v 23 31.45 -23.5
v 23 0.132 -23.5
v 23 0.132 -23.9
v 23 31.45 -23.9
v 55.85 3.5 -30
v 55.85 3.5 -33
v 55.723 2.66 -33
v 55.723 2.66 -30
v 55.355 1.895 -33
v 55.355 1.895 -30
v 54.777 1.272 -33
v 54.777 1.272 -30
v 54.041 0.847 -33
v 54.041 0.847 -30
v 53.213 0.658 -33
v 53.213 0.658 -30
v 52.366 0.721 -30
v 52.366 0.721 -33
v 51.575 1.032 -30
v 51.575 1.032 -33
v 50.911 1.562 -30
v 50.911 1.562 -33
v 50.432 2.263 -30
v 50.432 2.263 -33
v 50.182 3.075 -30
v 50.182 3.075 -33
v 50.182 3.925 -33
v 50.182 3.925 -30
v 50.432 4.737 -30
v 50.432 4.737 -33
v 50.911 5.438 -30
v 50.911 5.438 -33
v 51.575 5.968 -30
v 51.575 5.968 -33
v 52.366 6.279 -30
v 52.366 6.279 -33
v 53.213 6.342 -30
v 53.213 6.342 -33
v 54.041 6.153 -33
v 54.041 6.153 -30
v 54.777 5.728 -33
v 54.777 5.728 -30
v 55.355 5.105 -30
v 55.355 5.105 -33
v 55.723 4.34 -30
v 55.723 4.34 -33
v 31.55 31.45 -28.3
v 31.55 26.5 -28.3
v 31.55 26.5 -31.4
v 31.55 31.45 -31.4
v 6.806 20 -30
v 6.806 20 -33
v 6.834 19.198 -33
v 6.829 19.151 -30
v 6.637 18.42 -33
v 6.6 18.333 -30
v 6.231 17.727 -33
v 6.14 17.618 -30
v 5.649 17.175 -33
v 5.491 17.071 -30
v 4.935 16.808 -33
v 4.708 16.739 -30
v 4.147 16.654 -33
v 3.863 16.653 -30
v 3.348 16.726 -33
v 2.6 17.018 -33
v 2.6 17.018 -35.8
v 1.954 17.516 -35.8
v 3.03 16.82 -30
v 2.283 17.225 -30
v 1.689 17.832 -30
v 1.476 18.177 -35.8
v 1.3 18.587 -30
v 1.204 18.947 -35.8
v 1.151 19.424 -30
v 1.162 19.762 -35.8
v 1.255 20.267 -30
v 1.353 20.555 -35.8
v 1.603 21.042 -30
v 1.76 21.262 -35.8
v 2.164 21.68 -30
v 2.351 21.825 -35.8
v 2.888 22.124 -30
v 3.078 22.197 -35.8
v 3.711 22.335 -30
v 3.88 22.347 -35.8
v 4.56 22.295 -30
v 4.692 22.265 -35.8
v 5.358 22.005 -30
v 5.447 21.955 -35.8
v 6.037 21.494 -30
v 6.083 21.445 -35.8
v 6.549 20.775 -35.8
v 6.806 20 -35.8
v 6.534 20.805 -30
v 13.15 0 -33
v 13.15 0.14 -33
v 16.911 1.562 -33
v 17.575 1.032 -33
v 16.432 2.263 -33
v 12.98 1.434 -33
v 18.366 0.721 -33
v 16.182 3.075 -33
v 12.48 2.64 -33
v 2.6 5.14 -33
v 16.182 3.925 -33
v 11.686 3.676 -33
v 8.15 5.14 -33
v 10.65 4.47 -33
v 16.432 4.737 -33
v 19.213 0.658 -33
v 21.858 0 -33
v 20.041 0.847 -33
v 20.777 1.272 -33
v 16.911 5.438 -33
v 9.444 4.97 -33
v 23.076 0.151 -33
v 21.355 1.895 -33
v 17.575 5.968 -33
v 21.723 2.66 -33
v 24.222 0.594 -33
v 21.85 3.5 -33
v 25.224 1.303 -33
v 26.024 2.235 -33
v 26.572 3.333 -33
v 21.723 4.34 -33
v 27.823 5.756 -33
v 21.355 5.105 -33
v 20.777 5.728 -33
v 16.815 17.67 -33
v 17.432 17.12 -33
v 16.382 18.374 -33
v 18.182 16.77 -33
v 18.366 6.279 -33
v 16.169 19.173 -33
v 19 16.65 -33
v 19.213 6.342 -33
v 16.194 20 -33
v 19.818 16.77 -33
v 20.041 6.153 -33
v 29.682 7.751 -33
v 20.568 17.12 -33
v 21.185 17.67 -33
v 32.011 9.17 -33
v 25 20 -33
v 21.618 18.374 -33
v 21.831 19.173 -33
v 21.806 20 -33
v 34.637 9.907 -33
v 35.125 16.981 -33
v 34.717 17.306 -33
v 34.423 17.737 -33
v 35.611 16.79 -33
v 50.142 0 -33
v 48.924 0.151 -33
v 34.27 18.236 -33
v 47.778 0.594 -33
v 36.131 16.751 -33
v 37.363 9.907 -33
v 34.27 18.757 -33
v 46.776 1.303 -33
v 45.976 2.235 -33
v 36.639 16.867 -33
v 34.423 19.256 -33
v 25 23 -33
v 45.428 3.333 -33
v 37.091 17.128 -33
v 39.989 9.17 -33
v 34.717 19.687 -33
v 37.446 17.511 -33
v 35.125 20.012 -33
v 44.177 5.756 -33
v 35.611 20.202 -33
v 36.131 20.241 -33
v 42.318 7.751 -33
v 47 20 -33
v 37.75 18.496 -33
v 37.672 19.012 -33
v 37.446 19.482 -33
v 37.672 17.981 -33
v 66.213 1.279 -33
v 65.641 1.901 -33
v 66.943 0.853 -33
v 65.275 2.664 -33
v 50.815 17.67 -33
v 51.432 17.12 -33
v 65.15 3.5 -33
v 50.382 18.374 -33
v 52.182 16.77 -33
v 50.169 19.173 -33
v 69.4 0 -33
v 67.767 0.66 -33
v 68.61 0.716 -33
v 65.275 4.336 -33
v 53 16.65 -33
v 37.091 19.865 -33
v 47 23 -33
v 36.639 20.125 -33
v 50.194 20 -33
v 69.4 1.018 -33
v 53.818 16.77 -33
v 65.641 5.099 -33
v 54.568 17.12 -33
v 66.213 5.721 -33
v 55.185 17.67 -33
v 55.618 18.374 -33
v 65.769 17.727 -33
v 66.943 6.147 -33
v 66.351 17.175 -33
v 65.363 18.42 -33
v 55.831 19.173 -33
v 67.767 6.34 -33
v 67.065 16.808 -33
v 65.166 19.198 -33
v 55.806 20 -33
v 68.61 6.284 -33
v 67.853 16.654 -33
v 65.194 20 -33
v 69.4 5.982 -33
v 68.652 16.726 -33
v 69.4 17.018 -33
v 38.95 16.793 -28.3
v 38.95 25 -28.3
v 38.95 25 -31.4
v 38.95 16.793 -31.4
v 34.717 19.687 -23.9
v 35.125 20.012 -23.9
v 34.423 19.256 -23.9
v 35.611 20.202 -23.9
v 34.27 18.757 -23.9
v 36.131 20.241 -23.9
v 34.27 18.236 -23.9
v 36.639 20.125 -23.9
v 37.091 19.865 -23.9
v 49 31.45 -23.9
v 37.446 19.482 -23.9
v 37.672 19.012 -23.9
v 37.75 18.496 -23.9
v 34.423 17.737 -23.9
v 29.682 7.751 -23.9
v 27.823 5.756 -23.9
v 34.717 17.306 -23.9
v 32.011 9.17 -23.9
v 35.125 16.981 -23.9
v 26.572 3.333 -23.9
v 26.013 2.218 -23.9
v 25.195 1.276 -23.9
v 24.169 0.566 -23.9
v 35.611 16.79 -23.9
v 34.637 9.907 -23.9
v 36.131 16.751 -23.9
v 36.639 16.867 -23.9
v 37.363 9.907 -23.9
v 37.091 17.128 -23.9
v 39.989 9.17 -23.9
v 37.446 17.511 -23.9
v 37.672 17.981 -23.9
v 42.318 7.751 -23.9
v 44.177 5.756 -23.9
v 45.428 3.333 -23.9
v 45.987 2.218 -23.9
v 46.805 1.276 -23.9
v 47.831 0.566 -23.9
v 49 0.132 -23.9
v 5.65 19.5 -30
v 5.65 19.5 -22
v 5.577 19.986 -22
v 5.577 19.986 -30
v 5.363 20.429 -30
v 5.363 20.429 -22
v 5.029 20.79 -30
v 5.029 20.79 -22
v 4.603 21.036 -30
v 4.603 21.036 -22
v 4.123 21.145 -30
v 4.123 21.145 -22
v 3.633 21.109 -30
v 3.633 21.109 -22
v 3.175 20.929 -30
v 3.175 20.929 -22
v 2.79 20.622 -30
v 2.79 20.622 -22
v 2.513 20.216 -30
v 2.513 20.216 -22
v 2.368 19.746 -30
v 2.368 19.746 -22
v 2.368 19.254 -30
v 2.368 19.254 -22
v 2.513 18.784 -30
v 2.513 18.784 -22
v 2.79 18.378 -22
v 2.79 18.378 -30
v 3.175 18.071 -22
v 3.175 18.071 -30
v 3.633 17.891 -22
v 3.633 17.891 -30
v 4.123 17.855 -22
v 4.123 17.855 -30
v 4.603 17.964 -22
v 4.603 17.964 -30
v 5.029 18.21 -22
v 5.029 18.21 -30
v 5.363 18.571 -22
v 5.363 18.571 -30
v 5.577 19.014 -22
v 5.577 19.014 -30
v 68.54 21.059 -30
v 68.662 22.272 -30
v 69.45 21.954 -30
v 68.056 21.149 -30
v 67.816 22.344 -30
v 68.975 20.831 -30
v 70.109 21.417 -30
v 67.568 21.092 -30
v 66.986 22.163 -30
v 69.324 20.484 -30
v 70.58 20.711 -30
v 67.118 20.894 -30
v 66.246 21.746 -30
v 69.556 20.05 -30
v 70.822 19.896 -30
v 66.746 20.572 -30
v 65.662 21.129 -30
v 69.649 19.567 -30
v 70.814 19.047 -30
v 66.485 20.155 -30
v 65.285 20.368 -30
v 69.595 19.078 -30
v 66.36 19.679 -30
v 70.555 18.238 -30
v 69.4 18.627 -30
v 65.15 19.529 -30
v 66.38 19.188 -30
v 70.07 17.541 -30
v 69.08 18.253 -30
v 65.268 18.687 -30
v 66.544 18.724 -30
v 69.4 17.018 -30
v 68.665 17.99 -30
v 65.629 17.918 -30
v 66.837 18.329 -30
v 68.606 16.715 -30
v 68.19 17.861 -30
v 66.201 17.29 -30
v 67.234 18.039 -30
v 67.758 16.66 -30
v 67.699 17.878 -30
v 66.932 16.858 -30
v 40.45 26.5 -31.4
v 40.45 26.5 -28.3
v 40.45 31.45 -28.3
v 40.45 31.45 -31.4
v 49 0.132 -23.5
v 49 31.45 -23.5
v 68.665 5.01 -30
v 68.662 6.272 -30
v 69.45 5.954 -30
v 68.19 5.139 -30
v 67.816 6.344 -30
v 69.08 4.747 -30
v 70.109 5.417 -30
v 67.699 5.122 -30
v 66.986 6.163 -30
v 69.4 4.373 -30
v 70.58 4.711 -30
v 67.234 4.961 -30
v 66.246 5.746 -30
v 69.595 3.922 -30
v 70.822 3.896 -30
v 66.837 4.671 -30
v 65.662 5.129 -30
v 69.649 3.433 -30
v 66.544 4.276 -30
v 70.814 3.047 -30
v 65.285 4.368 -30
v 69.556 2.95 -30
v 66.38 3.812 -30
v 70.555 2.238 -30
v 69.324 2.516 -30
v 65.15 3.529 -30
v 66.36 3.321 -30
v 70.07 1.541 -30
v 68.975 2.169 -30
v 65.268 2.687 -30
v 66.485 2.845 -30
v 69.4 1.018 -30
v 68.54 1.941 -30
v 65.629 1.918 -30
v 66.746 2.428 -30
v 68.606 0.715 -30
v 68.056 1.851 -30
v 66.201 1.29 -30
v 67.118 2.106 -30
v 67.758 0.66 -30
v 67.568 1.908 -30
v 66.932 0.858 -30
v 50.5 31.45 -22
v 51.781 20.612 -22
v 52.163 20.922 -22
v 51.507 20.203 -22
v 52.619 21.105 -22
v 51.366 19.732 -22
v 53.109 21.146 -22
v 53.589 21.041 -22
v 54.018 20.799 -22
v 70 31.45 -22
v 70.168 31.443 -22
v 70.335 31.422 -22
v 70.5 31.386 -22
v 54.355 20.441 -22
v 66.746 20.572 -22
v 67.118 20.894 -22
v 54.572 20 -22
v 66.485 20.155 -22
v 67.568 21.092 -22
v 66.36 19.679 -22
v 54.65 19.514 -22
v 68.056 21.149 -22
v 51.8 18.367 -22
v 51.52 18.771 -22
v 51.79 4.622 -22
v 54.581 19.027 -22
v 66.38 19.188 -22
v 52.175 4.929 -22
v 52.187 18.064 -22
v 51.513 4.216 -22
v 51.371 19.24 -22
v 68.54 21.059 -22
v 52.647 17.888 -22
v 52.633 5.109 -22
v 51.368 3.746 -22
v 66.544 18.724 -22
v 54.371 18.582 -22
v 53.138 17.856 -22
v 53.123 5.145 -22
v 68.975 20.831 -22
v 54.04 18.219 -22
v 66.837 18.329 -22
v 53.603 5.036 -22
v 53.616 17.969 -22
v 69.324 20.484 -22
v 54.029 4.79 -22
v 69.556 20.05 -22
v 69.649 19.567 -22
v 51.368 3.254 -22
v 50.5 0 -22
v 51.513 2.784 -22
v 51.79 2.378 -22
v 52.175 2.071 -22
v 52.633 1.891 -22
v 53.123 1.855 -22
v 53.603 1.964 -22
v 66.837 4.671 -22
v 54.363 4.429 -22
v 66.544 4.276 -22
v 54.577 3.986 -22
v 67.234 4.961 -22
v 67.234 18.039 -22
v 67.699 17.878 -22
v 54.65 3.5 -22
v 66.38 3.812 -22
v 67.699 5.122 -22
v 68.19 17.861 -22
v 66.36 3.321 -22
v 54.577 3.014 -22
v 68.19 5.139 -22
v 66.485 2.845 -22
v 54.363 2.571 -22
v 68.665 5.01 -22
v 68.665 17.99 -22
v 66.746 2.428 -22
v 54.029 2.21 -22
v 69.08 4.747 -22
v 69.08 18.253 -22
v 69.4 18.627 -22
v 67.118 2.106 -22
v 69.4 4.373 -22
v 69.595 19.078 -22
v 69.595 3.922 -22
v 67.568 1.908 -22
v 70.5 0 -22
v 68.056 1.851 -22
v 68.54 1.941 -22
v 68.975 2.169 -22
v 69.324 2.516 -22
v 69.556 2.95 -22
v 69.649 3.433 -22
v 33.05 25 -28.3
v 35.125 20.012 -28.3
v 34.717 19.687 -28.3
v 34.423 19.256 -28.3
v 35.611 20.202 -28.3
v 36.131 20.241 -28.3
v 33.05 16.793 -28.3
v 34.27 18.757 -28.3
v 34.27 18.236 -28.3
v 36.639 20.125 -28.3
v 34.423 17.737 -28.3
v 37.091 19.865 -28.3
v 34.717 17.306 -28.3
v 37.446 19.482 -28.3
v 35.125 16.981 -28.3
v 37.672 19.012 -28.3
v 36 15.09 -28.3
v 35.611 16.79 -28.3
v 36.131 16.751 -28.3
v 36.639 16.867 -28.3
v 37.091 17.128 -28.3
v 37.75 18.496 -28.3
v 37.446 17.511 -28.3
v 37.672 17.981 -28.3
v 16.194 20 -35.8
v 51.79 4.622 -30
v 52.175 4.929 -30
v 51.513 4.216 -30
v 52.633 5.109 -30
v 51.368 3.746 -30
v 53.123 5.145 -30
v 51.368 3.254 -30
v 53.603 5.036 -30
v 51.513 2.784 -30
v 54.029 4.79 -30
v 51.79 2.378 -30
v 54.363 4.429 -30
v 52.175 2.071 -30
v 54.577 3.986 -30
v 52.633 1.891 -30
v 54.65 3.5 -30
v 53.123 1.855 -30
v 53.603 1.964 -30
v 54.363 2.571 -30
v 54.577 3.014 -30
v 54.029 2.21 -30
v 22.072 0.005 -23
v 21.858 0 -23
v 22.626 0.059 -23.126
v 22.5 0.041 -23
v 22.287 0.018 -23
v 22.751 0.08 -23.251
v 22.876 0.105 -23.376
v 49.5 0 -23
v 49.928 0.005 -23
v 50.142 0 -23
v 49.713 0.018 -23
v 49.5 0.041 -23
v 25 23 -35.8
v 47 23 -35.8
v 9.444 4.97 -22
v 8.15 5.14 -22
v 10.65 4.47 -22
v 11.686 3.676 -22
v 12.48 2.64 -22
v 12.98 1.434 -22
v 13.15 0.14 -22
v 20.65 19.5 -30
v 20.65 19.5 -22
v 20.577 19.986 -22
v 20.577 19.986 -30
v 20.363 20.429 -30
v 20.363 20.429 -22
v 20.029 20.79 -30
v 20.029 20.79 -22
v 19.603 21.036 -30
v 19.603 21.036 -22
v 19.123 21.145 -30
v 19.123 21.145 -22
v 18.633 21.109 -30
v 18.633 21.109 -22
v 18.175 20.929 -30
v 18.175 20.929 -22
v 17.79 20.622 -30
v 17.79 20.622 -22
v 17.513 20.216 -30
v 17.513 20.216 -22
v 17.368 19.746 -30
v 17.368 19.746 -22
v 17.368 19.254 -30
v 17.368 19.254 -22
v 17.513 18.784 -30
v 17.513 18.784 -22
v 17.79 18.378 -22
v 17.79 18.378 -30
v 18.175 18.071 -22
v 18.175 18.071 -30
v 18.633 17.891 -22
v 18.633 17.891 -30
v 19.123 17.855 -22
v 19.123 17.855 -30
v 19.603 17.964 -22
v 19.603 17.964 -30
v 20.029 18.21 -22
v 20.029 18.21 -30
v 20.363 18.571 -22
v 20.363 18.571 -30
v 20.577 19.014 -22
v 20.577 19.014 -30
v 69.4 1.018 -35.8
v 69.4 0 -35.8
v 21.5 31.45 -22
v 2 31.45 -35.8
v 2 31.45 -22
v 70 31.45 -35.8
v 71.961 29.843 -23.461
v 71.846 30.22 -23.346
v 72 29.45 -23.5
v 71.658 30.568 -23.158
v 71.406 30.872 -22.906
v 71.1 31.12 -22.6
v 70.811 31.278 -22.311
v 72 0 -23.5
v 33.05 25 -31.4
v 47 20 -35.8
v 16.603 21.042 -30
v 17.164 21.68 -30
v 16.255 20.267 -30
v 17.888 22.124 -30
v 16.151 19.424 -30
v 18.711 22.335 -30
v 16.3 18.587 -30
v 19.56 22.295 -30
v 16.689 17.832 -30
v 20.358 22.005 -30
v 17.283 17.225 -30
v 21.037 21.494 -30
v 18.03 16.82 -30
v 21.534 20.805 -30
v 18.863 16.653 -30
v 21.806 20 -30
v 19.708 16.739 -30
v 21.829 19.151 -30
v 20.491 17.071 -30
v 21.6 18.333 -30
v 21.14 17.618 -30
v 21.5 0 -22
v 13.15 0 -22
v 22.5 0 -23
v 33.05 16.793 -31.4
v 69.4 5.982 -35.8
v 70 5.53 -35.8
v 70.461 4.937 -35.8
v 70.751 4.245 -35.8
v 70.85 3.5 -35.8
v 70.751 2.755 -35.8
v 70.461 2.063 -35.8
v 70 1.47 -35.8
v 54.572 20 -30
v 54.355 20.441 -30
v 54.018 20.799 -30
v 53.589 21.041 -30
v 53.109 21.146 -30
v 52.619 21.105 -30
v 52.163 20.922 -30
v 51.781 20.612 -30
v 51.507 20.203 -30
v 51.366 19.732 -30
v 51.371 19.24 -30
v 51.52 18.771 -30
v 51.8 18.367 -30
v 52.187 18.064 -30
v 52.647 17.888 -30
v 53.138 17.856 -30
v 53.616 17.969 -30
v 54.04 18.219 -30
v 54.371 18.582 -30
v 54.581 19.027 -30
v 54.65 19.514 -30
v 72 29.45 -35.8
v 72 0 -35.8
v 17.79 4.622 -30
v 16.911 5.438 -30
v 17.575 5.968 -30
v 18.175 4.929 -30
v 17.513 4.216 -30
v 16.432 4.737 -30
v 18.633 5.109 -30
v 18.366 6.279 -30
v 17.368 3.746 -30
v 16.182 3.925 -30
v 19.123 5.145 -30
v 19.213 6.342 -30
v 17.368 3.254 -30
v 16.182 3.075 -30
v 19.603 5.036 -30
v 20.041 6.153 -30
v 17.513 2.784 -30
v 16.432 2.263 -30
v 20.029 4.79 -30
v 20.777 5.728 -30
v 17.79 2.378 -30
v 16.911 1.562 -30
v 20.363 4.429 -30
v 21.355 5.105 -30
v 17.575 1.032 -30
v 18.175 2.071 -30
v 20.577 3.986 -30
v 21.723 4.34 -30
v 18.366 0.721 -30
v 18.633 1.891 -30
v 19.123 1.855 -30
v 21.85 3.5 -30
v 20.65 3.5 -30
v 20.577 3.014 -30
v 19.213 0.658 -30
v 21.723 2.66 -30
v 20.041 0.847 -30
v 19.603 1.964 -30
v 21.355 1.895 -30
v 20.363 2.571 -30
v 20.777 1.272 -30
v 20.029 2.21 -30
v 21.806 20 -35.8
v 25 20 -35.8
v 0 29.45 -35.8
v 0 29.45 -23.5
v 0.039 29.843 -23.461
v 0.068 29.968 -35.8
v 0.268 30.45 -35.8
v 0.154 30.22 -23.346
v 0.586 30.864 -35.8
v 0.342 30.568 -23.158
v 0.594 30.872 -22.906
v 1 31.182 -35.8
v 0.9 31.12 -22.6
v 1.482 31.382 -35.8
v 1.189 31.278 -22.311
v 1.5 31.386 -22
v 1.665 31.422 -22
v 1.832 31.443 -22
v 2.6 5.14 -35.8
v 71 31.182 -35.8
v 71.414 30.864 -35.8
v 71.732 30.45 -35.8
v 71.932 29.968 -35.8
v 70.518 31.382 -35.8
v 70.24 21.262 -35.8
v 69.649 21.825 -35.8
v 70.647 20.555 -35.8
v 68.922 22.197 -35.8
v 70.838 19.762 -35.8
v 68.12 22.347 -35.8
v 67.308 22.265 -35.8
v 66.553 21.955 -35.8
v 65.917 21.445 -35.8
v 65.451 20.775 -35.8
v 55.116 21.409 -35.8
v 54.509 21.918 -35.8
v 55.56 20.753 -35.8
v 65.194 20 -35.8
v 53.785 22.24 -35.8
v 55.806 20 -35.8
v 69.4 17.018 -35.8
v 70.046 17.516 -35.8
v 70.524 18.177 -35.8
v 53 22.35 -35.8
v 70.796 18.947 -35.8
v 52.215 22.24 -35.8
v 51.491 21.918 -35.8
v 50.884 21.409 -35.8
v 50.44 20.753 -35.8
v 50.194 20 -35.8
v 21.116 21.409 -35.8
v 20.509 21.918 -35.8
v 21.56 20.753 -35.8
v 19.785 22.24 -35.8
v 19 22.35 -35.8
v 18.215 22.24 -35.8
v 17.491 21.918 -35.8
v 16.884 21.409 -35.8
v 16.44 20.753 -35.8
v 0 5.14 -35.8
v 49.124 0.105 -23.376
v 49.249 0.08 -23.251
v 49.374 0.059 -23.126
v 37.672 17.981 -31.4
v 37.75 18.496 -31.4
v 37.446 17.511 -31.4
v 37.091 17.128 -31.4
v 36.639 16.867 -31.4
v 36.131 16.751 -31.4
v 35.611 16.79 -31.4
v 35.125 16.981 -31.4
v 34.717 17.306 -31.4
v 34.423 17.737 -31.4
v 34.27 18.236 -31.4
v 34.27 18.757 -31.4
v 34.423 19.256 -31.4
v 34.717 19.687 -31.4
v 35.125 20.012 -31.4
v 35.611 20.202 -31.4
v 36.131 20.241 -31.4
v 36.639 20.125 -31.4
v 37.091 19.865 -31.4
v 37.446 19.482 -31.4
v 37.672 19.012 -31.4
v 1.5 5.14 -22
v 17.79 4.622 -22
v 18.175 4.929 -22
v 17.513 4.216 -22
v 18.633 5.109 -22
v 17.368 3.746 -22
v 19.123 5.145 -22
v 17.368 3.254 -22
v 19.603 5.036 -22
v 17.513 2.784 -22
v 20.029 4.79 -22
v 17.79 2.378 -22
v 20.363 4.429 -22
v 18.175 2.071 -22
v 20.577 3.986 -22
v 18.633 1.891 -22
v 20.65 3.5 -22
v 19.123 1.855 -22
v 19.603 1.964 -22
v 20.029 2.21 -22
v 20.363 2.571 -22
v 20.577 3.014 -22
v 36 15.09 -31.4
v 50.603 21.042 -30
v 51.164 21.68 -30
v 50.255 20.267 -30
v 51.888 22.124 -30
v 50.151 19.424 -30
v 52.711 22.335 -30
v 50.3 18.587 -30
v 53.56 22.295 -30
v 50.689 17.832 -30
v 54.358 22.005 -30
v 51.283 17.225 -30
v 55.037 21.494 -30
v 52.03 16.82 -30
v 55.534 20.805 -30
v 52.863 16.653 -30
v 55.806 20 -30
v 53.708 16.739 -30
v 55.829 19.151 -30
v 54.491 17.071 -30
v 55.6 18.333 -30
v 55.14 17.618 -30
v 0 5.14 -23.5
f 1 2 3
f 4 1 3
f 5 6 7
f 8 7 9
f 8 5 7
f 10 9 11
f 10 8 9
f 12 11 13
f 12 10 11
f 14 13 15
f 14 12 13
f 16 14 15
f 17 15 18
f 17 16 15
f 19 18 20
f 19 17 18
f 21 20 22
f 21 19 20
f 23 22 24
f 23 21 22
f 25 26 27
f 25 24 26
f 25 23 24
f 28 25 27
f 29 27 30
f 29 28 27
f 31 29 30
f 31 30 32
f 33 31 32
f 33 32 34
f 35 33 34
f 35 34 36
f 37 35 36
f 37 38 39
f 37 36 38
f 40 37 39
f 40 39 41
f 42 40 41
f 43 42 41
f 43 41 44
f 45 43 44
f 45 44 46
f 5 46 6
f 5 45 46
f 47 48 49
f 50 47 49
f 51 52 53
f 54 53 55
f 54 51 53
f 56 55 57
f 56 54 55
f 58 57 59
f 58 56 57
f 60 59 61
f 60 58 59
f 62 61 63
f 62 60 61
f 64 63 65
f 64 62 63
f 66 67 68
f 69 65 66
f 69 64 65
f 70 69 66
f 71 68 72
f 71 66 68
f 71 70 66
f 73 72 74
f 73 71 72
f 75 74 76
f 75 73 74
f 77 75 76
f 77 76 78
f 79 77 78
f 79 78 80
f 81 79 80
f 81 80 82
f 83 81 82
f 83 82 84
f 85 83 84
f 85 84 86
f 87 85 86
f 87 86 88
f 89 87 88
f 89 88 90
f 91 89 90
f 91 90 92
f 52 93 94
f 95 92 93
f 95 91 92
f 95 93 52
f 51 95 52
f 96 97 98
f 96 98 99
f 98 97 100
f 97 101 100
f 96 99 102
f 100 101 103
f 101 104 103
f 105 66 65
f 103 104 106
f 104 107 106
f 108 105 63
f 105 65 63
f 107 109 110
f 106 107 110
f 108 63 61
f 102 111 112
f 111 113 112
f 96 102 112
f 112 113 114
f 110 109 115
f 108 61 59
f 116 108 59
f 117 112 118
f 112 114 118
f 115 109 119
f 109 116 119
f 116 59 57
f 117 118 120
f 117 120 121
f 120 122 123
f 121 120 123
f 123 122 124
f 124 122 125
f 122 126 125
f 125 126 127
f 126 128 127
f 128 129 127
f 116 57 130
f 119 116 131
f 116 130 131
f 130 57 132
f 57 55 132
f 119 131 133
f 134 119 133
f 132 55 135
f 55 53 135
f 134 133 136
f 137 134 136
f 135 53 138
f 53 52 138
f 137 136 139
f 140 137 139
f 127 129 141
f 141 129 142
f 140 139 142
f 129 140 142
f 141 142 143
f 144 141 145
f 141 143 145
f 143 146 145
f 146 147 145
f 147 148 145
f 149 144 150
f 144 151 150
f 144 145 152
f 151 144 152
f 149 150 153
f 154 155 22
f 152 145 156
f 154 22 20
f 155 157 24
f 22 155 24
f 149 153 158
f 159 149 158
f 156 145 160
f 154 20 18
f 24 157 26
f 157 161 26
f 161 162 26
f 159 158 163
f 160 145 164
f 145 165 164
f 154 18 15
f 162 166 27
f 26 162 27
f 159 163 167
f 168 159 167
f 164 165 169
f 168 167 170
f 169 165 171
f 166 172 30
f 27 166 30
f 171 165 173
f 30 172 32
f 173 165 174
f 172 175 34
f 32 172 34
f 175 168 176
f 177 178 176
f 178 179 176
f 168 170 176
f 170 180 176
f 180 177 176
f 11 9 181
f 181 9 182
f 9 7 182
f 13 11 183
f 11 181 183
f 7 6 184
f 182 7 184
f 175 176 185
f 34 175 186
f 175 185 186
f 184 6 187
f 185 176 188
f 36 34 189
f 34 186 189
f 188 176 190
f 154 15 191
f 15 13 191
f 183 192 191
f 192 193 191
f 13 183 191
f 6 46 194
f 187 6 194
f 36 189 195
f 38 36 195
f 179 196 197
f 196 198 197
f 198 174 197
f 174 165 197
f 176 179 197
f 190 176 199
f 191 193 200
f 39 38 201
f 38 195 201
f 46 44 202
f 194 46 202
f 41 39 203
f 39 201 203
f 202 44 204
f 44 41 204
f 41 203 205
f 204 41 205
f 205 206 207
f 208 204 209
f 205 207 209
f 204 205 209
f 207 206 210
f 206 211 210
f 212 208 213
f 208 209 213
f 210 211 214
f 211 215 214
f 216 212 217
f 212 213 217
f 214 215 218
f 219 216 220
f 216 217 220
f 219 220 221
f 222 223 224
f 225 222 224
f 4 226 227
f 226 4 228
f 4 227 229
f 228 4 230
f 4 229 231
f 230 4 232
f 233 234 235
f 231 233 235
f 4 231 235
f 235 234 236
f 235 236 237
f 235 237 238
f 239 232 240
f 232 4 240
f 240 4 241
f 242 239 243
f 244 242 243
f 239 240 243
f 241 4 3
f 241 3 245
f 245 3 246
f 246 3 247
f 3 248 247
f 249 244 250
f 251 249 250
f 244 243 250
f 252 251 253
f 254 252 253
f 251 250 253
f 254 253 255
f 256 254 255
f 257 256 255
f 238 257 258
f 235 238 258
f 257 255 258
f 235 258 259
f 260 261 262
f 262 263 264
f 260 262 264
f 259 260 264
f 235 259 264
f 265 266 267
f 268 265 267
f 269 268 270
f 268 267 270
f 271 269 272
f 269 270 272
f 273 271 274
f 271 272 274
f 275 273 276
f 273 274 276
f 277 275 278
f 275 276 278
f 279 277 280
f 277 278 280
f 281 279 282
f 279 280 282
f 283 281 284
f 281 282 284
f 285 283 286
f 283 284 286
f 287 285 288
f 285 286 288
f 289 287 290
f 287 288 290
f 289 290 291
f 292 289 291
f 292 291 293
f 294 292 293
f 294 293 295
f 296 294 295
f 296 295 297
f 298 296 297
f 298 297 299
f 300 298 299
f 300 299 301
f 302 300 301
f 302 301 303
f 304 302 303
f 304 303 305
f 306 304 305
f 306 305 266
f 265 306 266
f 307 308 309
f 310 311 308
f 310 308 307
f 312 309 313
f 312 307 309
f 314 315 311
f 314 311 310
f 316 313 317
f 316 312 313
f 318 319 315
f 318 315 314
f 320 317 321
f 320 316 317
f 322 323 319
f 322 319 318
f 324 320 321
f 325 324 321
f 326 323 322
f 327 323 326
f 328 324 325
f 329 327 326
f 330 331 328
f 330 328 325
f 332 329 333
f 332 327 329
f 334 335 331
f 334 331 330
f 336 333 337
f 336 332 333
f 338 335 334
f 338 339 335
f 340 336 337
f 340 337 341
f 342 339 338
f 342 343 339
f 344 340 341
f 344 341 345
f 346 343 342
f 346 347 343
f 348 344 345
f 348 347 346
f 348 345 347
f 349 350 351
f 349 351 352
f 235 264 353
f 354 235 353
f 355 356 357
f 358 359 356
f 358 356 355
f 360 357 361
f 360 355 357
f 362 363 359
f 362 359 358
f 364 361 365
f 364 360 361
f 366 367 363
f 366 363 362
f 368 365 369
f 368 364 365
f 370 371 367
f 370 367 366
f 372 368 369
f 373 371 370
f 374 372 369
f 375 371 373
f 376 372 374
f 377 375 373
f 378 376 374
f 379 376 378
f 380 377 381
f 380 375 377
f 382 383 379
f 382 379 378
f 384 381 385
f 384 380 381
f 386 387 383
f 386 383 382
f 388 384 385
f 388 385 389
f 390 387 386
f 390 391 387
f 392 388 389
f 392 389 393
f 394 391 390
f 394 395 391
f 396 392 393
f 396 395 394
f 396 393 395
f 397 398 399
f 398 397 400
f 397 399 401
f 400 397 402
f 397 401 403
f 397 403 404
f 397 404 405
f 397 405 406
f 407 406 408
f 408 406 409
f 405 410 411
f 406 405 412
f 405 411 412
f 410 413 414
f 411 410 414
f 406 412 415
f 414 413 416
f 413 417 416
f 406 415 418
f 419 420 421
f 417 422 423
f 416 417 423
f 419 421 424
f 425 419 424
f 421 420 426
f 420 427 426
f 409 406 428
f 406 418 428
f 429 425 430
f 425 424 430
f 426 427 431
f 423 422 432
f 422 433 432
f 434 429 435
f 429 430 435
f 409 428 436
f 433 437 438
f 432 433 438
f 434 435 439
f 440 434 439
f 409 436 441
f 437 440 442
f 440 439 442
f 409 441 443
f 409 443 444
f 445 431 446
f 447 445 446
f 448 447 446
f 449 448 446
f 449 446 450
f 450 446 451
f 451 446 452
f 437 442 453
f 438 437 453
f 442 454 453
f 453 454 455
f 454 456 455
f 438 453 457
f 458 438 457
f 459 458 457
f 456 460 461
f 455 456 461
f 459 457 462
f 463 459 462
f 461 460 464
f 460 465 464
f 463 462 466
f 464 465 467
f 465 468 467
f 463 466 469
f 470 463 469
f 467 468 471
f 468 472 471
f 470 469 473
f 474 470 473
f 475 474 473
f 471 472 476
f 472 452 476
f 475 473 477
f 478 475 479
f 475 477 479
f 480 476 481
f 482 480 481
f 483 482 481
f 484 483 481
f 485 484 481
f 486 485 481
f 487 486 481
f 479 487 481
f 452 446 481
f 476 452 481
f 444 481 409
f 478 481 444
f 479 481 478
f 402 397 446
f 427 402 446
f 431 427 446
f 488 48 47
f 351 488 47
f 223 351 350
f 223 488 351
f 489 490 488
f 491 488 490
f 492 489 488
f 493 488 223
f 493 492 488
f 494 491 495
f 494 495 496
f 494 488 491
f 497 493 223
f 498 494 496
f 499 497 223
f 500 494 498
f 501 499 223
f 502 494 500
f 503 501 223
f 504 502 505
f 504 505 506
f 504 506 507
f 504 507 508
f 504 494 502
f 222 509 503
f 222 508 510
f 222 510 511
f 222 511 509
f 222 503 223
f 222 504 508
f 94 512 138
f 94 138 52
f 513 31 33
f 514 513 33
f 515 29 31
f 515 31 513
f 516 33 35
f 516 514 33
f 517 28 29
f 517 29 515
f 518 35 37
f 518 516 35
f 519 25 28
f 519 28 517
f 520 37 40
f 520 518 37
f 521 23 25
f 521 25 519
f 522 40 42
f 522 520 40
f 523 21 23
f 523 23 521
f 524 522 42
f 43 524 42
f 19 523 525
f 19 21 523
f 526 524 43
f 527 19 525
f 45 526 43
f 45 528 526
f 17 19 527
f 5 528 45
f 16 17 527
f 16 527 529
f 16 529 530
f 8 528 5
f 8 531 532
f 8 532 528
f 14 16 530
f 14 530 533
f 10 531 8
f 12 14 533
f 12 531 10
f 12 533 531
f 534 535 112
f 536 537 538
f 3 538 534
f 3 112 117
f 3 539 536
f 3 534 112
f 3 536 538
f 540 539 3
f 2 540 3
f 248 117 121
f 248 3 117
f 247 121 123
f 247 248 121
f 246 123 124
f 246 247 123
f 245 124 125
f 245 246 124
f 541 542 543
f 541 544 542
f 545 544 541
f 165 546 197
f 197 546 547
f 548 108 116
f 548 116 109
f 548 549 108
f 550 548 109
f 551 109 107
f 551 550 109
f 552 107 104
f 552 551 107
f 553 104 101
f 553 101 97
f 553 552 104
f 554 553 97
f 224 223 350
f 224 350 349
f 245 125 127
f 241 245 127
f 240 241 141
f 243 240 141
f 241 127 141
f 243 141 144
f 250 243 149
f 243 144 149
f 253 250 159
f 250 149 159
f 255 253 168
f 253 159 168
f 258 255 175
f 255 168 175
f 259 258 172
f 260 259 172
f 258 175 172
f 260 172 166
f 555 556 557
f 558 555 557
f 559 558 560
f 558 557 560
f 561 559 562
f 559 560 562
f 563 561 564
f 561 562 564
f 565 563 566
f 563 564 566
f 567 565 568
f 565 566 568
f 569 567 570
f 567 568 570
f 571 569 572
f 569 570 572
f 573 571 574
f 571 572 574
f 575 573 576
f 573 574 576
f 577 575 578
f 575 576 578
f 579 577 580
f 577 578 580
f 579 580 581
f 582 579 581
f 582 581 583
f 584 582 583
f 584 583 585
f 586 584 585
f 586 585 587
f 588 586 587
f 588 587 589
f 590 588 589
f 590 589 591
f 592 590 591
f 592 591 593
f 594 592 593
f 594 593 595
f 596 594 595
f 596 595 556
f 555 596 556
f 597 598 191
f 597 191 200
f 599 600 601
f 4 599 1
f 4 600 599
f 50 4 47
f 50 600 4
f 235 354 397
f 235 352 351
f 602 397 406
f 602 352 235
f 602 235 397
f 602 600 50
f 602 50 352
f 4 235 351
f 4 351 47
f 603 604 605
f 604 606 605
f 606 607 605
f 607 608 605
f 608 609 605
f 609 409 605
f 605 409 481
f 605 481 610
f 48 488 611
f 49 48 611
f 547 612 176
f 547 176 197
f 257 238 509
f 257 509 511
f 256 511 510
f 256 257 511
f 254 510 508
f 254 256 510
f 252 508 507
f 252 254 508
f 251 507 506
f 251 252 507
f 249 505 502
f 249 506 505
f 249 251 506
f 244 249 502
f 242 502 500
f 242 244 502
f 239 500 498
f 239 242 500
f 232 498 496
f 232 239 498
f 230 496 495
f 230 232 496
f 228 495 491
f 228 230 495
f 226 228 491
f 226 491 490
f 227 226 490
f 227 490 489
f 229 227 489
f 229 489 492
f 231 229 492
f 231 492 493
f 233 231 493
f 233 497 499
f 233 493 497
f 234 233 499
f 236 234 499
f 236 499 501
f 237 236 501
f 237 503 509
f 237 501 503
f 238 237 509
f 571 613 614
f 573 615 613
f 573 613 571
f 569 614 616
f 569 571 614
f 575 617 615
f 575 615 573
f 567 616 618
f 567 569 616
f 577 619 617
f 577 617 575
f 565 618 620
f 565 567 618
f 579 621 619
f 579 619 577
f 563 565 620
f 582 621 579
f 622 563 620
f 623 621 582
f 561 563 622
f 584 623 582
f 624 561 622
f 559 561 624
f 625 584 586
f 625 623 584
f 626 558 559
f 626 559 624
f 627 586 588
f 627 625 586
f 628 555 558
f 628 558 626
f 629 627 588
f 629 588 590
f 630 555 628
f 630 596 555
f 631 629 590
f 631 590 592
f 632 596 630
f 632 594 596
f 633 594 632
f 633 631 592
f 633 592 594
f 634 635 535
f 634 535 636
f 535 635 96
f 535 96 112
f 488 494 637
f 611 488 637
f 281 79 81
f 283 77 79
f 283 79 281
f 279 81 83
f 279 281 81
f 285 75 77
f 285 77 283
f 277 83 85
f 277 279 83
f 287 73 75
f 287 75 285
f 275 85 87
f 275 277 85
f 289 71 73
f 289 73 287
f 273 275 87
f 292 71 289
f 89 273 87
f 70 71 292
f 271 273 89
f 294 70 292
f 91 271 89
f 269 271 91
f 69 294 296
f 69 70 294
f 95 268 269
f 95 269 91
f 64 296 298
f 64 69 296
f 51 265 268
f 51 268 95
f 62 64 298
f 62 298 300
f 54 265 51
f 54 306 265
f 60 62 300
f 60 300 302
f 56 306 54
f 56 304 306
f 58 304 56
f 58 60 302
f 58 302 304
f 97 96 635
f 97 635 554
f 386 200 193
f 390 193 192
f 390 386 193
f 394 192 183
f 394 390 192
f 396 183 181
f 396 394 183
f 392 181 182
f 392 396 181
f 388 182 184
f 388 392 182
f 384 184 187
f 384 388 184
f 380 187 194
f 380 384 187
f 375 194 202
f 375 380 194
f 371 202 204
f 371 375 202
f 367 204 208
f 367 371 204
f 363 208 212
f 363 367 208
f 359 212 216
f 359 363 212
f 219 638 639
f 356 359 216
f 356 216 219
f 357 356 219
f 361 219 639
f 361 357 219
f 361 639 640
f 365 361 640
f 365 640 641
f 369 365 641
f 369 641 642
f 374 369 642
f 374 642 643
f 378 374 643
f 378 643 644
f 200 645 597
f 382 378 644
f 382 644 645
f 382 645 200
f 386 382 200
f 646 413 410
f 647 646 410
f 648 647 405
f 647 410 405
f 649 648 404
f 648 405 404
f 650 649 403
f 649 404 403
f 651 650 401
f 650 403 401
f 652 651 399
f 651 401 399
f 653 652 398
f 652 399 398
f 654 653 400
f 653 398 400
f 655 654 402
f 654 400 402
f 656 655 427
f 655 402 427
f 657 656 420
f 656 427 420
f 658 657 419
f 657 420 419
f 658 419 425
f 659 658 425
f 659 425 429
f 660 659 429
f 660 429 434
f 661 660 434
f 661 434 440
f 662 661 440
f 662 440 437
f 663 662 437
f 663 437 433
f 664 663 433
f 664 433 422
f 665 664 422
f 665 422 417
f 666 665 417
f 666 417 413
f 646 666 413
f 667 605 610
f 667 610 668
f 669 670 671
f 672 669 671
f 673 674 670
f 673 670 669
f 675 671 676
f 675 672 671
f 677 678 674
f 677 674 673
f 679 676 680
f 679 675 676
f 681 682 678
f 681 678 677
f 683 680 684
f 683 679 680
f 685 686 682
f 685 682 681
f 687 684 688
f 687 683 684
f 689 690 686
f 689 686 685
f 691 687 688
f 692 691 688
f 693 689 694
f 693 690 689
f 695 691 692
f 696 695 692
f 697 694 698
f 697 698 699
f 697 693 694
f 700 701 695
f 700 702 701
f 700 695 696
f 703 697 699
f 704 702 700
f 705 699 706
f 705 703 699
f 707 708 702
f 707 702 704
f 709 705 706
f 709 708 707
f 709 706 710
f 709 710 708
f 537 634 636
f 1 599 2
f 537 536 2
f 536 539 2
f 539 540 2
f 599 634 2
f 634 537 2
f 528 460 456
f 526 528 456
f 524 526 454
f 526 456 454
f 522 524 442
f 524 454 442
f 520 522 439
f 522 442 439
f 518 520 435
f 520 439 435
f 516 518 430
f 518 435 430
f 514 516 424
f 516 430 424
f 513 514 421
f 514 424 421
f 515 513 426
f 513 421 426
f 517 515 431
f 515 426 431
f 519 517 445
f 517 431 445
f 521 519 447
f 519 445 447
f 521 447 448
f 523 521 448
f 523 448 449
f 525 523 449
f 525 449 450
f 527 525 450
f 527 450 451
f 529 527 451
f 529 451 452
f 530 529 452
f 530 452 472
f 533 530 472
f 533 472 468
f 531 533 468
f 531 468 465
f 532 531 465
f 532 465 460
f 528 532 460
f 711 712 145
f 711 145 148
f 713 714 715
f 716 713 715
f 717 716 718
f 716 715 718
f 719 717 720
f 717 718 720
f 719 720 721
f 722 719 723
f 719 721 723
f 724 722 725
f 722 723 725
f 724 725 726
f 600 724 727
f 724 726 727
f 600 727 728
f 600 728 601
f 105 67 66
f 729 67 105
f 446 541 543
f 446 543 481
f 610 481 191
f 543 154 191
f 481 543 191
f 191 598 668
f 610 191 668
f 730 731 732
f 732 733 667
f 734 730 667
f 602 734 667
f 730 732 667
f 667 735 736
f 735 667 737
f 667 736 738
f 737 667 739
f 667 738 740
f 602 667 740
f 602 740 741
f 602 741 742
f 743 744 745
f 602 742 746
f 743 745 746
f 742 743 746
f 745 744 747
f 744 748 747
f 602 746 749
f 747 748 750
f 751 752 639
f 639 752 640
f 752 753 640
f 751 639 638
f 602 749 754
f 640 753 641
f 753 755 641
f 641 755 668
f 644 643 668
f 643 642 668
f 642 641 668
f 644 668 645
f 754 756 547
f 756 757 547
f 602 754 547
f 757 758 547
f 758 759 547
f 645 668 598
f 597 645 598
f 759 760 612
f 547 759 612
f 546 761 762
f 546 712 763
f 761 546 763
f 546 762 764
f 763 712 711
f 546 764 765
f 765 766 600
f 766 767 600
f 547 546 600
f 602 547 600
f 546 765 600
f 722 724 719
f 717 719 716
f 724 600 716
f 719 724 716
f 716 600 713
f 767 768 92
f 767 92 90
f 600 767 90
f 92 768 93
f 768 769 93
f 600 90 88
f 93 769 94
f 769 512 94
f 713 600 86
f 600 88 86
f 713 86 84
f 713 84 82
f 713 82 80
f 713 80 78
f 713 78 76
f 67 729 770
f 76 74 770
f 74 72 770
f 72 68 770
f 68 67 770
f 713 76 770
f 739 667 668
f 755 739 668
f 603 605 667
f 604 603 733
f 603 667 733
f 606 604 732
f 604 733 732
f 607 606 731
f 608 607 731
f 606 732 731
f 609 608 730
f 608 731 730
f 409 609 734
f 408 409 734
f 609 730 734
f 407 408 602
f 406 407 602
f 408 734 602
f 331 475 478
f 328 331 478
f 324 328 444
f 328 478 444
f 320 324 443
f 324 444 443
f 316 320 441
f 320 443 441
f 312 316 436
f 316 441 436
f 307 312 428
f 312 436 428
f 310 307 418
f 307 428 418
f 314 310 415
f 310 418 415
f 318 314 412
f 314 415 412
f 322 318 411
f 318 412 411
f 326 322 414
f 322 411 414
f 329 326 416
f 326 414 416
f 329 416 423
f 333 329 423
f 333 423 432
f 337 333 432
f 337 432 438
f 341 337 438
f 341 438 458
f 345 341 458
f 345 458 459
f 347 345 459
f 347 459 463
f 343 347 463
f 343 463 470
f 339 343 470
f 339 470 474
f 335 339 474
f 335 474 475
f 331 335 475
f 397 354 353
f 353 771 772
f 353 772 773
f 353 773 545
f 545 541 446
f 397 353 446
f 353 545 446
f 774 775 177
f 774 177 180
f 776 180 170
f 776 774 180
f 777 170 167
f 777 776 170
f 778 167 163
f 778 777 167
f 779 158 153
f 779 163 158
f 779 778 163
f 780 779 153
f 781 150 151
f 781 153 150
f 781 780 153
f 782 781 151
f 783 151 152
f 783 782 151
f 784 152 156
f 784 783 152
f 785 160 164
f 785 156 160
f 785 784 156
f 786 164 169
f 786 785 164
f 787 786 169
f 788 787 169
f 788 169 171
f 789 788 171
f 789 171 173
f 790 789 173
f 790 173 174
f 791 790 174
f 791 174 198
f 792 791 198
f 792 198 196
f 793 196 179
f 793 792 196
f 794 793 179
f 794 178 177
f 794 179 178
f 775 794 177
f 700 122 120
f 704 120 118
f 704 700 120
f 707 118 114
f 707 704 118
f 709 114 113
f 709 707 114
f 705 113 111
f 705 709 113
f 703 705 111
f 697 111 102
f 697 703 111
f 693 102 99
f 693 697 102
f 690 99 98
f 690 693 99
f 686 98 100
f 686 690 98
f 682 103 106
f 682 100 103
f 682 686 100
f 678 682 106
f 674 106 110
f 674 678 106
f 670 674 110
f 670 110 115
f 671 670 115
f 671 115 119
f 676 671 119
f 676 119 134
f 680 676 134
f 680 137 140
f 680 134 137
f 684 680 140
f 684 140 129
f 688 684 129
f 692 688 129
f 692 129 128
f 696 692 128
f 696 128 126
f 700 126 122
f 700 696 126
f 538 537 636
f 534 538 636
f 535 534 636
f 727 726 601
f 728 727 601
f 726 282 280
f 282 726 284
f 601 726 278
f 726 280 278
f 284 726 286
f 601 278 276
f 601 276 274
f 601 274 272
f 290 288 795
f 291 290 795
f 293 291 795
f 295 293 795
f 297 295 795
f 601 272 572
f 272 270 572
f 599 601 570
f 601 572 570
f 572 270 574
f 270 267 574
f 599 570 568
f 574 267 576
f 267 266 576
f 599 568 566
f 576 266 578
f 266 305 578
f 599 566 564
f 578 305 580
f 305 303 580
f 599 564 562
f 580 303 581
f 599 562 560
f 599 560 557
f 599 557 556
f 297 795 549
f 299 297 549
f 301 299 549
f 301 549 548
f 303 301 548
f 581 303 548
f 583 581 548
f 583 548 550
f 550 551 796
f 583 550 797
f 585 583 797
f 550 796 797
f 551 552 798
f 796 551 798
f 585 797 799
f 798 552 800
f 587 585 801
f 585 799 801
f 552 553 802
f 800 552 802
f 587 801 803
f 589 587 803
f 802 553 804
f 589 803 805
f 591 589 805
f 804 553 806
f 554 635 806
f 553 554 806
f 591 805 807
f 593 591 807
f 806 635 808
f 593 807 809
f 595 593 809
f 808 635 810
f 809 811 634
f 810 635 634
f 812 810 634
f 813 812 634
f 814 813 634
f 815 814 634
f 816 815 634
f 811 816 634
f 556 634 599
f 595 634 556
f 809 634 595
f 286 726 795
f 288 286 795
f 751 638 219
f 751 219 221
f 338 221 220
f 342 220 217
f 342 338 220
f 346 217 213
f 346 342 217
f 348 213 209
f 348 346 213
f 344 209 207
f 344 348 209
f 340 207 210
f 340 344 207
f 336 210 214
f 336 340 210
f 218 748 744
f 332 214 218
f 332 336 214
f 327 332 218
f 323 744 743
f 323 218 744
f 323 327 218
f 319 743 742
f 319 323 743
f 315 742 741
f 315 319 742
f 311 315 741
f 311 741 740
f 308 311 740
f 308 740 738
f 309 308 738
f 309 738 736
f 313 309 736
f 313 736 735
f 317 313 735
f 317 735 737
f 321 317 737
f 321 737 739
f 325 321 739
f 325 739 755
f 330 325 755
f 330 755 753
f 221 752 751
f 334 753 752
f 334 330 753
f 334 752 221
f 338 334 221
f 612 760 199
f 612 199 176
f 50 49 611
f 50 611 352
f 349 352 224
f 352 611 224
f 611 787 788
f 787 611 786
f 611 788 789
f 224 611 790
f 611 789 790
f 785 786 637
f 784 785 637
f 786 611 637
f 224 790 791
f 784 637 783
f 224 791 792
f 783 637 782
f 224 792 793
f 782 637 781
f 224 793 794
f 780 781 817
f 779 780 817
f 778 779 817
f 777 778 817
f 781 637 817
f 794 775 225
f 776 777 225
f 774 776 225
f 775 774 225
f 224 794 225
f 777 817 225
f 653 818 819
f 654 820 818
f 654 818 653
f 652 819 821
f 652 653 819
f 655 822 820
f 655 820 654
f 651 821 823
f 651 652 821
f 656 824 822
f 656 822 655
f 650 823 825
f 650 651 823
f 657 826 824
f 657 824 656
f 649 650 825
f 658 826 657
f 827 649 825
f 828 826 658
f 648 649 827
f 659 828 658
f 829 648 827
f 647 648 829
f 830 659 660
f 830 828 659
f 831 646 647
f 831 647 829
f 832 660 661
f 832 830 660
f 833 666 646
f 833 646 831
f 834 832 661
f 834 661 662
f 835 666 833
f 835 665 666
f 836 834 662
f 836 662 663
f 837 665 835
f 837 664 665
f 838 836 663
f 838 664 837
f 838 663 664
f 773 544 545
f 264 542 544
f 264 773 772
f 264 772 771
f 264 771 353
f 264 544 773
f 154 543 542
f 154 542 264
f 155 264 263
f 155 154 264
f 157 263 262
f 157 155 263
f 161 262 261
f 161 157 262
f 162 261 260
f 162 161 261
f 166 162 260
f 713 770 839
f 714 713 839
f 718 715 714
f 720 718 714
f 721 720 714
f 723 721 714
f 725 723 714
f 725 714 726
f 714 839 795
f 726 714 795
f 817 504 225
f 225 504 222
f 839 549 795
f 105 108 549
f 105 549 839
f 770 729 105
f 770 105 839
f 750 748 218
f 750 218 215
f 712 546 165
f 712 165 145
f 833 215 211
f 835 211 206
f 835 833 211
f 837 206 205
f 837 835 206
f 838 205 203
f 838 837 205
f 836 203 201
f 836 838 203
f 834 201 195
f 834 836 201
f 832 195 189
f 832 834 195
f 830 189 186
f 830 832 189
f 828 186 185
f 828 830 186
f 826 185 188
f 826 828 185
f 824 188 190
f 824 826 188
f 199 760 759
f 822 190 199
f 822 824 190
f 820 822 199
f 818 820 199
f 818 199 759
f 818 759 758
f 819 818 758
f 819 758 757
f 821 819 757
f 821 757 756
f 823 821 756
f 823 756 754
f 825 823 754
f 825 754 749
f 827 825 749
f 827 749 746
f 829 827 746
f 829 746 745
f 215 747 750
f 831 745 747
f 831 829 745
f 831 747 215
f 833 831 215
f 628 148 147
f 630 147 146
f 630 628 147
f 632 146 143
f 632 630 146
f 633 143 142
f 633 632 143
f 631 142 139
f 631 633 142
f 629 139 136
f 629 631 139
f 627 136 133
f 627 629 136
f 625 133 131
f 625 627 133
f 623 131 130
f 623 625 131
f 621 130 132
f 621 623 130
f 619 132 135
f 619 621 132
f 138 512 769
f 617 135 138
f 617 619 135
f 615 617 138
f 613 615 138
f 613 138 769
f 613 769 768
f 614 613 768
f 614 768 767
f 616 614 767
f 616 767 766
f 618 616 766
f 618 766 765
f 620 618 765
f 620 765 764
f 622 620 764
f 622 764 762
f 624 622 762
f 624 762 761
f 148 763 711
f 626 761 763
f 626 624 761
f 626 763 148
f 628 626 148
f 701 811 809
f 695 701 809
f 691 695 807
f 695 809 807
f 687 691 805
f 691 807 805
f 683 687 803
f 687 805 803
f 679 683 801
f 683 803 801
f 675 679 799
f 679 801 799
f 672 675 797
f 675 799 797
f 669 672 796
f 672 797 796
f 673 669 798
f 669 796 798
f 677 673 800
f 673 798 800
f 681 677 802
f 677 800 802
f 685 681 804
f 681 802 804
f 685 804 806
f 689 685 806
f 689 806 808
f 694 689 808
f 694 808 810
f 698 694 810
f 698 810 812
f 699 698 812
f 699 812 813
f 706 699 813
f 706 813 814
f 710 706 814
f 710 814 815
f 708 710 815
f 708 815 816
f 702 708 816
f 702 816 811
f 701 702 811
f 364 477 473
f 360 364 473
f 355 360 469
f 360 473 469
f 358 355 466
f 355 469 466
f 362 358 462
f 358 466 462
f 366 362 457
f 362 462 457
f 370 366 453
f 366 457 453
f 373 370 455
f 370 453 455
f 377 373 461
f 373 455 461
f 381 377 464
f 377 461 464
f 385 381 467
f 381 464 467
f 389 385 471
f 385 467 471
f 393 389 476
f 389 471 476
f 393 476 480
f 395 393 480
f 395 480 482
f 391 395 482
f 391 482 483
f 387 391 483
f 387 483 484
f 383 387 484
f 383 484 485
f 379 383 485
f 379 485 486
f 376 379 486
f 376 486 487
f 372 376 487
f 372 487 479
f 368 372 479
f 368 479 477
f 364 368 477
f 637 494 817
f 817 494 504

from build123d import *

# Parameters (mm, degrees)
CROQUIS1_W                  = 72
CROQUIS1_H                  = 35.8
SALIENTE_EXTRUIR1_DEPTH     = 23
CORTAR_EXTRUIR2_DEPTH       = 2.8
CROQUIS3_W                  = 5.9
CROQUIS3_H                  = 3.1
CORTAR_EXTRUIR3_DEPTH       = 7.91
SALIENTE_EXTRUIR3_DEPTH     = 3.1
CROQUIS7_W                  = 72
CROQUIS7_H                  = 22
CORTAR_EXTRUIR6_DEPTH       = 37.91
CORTAR_EXTRUIR8_DEPTH       = 15
CORTAR_EXTRUIR8_DEPTH_BACK  = 15
CROQUIS9_R                  = 1.75
CROQUIS11_R                 = 10
CORTAR_EXTRUIR10_DEPTH      = 10
REDONDEO1_R                 = 5
CROQUIS12_W                 = 72
CROQUIS12_H                 = 13.8
CROQUIS12_W_2               = 5.9
CROQUIS12_H_2               = 3.1
SALIENTE_EXTRUIR4_DEPTH     = 3.5
CROQUIS13_R                 = 1.65
CORTAR_EXTRUIR11_DEPTH      = 33.5
CORTAR_EXTRUIR12_DEPTH      = 33.5
CORTAR_EXTRUIR12_DEPTH_BACK = 3
CROQUIS14_R                 = 2.85
CROQUIS15_W                 = 26
CROQUIS15_H                 = 1.9
CORTAR_EXTRUIR13_DEPTH      = 43
CHAFL_N1_SIZE               = 1.5
CHAFL_N2_SIZE               = 1.5
CROQUIS16_W                 = 13.15
CROQUIS16_H                 = 5.14
CORTAR_EXTRUIR14_DEPTH      = 20
REDONDEO3_R                 = 5
CROQUIS17_W                 = 8.9
CROQUIS17_H                 = 3.1
SALIENTE_EXTRUIR5_DEPTH     = 4.95
REDONDEO4_R                 = 2


with BuildPart() as part:
    # Croquis1 → Saliente-Extruir1 (new body)
    with BuildSketch(Plane(origin=(0, 0, 0), x_dir=(1, 0, 0), z_dir=(0, 1, 0))):
        with Locations((36, 17.9)):
            Rectangle(CROQUIS1_W, CROQUIS1_H)
    extrude(amount=SALIENTE_EXTRUIR1_DEPTH)

    # Croquis2 → Cortar-Extruir2 (cut)
    with BuildSketch(Plane(origin=(0, 0, -35.8), x_dir=(-1, 0, 0), z_dir=(0, 0, -1))):
        Polygon((-69.4, 20), (-47, 20), (-47, 23), (-25, 23), (-25, 20), (-2.6, 20), (-2.6, -5), (-69.4, -5), align=None)
    extrude(amount=-CORTAR_EXTRUIR2_DEPTH, mode=Mode.SUBTRACT)

    # Croquis3 → Cortar-Extruir3 (cut)
    with BuildSketch(Plane(origin=(0, 23, 0), x_dir=(1, 0, 0), z_dir=(0, 1, 0))):
        with Locations((36, 29.85)):
            Rectangle(CROQUIS3_W, CROQUIS3_H)
    extrude(amount=-CORTAR_EXTRUIR3_DEPTH, mode=Mode.SUBTRACT)

    # Croquis4 → Saliente-Extruir3 (add)
    with BuildSketch(Plane(origin=(0, 0, -28.3), x_dir=(-1, 0, 0), z_dir=(0, 0, -1))):
        Polygon((-33.05, 16.793183294), (-36, 15.09), (-33.05, 15.09), align=None)
        Polygon((-36, 15.09), (-38.95, 16.793183294), (-38.95, 15.09), align=None)
    extrude(amount=SALIENTE_EXTRUIR3_DEPTH)

    # Croquis7 → Cortar-Extruir6 (cut)
    with BuildSketch(Plane(origin=(0, 23, 0), x_dir=(1, 0, 0), z_dir=(0, 1, 0))):
        with Locations((36, 11)):
            Rectangle(CROQUIS7_W, CROQUIS7_H)
    extrude(amount=-CORTAR_EXTRUIR6_DEPTH, mode=Mode.SUBTRACT)

    # Croquis9 → Cortar-Extruir8 (cut, two sides: drawn at the far end of the back side and taken through both)
    with BuildSketch(Plane(origin=(0, 0, -28.3), x_dir=(-1, 0, 0), z_dir=(0, 0, -1)).offset(-CORTAR_EXTRUIR8_DEPTH_BACK)):
        with Locations(Location((-36, 18.496366588, 0), (0, 0, 180))):
            Circle(CROQUIS9_R)
    extrude(amount=CORTAR_EXTRUIR8_DEPTH + CORTAR_EXTRUIR8_DEPTH_BACK, mode=Mode.SUBTRACT)

    # Croquis11 → Cortar-Extruir10 (cut)
    with BuildSketch(Plane(origin=(0, 0, -33), x_dir=(-1, 0, 0), z_dir=(0, 0, -1))):
        with Locations((-36, 0)):
            Circle(CROQUIS11_R)
    extrude(amount=-CORTAR_EXTRUIR10_DEPTH, mode=Mode.SUBTRACT)

    # Redondeo1
    redondeo1_edges = [part.edges().sort_by_distance(p)[0] for p in [
        (26, 0, -28),
        (46, 0, -28),
    ]]
    fillet(redondeo1_edges, radius=REDONDEO1_R)

    # Croquis12 → Saliente-Extruir4 (add)
    with BuildSketch(Plane(origin=(0, 23, 0), x_dir=(1, 0, 0), z_dir=(0, 1, 0))):
        with Locations((36, 28.9)):
            Rectangle(CROQUIS12_W, CROQUIS12_H)
        with Locations((36, 29.85)):
            Rectangle(CROQUIS12_W_2, CROQUIS12_H_2, mode=Mode.SUBTRACT)
    extrude(amount=SALIENTE_EXTRUIR4_DEPTH)

    # Croquis13 → Cortar-Extruir11 (cut)
    with BuildSketch(Plane.XY.offset(-22)):
        with Locations((19, 3.5)):
            Circle(CROQUIS13_R)
        with Locations((19, 19.5)):
            Circle(CROQUIS13_R)
        with Locations((4, 19.5)):
            Circle(CROQUIS13_R)
        with Locations((53, 3.5)):
            Circle(CROQUIS13_R)
        with Locations(Location((68, 3.5, 0), (0, 0, 31.9527464))):
            Circle(CROQUIS13_R)
        with Locations(Location((68, 19.5, 0), (0, 0, 328.0472536))):
            Circle(CROQUIS13_R)
        with Locations(Location((53, 19.5, 0), (0, 0, 17.639701394))):
            Circle(CROQUIS13_R)
    extrude(amount=-CORTAR_EXTRUIR11_DEPTH, mode=Mode.SUBTRACT)

    # Croquis14 → Cortar-Extruir12 (cut, two sides: drawn at the far end of the back side and taken through both)
    with BuildSketch(Plane(origin=(0, 0, -33), x_dir=(-1, 0, 0), z_dir=(0, 0, -1)).offset(-CORTAR_EXTRUIR12_DEPTH_BACK)):
        with Locations(Location((-53, 19.5, 0), (0, 0, 169.895817284))):
            Circle(CROQUIS14_R)
        with Locations(Location((-53, 3.5, 0), (0, 0, 180))):
            Circle(CROQUIS14_R)
        with Locations(Location((-68, 3.5, 0), (0, 0, 240.578668933))):
            Circle(CROQUIS14_R)
        with Locations(Location((-68, 19.5, 0), (0, 0, 240.578668933))):
            Circle(CROQUIS14_R)
        with Locations(Location((-19, 3.5, 0), (0, 0, 180))):
            Circle(CROQUIS14_R)
        with Locations(Location((-19, 19.5, 0), (0, 0, 169.895817284))):
            Circle(CROQUIS14_R)
        with Locations(Location((-4, 19.5, 0), (0, 0, 169.895817284))):
            Circle(CROQUIS14_R)
    extrude(amount=CORTAR_EXTRUIR12_DEPTH + CORTAR_EXTRUIR12_DEPTH_BACK, mode=Mode.SUBTRACT)

    # Croquis15 → Cortar-Extruir13 (cut)
    with BuildSketch(Plane(origin=(0, 26.5, 0), x_dir=(1, 0, 0), z_dir=(0, 1, 0))):
        with Locations((36, 22.95)):
            Rectangle(CROQUIS15_W, CROQUIS15_H)
    extrude(amount=-CORTAR_EXTRUIR13_DEPTH, mode=Mode.SUBTRACT)

    # Chaflán1
    chafl_n1_edges = [part.edges().sort_by_distance(p)[0] for p in [
        (49, 13.25, -22),
        (23, 13.25, -22),
        (72, 13.25, -22),
        (0, 13.25, -22),
    ]]
    chamfer(chafl_n1_edges, length=CHAFL_N1_SIZE)

    # Chaflán2
    chafl_n2_edges = [part.edges().sort_by_distance(p)[0] for p in [
        (33.05, 26.5, -29.85),
        (38.95, 26.5, -29.85),
    ]]
    chamfer(chafl_n2_edges, length=CHAFL_N2_SIZE)

    # Croquis16 → Cortar-Extruir14 (cut)
    with BuildSketch(Plane(origin=(0, 0, -35.8), x_dir=(-1, 0, 0), z_dir=(0, 0, -1))):
        with Locations((-6.575, 2.57)):
            Rectangle(CROQUIS16_W, CROQUIS16_H)
    extrude(amount=-CORTAR_EXTRUIR14_DEPTH, mode=Mode.SUBTRACT)

    # Redondeo3
    redondeo3_edges = [part.edges().sort_by_distance(p)[0] for p in [
        (13.15, 5.14, -27.5),
    ]]
    fillet(redondeo3_edges, radius=REDONDEO3_R)

    # Croquis17 → Saliente-Extruir5 (add)
    with BuildSketch(Plane(origin=(0, 26.5, 0), x_dir=(1, 0, 0), z_dir=(0, 1, 0))):
        Polygon((70.5, 22), (72, 23.5), (72, 35.8), (0, 35.8), (0, 23.5), (1.5, 22), (21.5, 22), (23, 23.5), (23, 23.9), (49, 23.9), (49, 23.5), (50.5, 22), align=None)
        with Locations((36, 29.85)):
            Rectangle(CROQUIS17_W, CROQUIS17_H, mode=Mode.SUBTRACT)
    extrude(amount=SALIENTE_EXTRUIR5_DEPTH)

    # Redondeo4
    redondeo4_edges = [part.edges().sort_by_distance(p)[0] for p in [
        (72, 31.45, -29.65),
        (0, 31.45, -29.65),
    ]]
    fillet(redondeo4_edges, radius=REDONDEO4_R)


solid = part.part
